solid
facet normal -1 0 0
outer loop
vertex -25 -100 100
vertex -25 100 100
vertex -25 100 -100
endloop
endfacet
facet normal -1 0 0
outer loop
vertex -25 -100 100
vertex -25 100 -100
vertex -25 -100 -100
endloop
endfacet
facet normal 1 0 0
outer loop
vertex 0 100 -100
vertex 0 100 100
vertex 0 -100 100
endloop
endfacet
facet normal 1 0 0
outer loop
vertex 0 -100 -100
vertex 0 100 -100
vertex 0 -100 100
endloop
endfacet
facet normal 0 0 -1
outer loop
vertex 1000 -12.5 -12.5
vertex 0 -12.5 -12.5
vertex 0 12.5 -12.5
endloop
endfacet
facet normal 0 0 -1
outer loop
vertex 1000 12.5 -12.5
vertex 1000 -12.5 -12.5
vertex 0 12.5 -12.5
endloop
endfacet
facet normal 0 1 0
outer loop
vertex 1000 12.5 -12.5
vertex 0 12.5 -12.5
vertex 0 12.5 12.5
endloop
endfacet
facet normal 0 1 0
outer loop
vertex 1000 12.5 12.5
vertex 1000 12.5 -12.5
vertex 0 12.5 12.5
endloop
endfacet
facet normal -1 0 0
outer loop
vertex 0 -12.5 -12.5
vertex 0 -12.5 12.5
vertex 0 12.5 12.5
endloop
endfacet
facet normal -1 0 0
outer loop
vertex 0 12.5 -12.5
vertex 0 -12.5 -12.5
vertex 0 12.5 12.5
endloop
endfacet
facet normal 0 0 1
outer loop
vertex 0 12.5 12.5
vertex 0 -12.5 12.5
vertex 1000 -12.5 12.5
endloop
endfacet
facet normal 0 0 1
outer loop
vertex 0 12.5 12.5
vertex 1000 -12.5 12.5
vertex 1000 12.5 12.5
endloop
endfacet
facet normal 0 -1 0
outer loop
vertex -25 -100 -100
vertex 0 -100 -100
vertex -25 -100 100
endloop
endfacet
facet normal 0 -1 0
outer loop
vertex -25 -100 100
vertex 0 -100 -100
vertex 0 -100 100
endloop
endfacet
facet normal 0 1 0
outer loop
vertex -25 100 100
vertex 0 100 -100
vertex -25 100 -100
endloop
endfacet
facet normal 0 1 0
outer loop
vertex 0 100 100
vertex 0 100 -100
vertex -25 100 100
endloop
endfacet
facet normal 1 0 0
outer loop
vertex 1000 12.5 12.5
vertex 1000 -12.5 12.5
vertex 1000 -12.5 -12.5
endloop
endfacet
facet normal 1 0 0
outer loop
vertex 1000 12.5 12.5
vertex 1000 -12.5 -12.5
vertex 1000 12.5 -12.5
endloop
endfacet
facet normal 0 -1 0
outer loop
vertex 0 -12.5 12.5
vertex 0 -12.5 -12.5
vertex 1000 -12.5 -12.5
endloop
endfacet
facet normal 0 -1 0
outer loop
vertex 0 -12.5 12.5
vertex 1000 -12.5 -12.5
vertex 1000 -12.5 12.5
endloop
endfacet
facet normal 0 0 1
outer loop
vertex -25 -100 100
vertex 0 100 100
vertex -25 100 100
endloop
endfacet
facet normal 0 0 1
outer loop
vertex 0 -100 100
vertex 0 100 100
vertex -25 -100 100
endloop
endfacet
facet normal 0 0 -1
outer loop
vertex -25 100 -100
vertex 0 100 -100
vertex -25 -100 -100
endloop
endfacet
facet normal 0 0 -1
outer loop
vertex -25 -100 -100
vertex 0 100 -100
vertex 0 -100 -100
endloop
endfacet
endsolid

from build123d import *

# Parameters (mm, degrees)
F0_W     = 25
F0_H     = 25
F1_DEPTH = 1000
F2_W     = 200
F2_H     = 200
F2_W_2   = 25
F2_H_2   = 25
F3_DEPTH = 25


with BuildPart() as f1:
    # F0 (on Right) → F1 (new body)
    with BuildSketch(Plane.YZ):
        Rectangle(F0_W, F0_H)
    extrude(amount=F1_DEPTH)


with BuildPart() as f3:
    # F2 (on face) → F3 (new body)
    with BuildSketch(Plane(origin=(0, 0, 0), x_dir=(0, -1, 0), z_dir=(-1, 0, 0))):
        Rectangle(F2_W, F2_H)
        Rectangle(F2_W_2, F2_H_2, mode=Mode.SUBTRACT)
        Rectangle(F2_W_2, F2_H_2)
    extrude(amount=F3_DEPTH)


solid = Compound([f1.part, f3.part])
